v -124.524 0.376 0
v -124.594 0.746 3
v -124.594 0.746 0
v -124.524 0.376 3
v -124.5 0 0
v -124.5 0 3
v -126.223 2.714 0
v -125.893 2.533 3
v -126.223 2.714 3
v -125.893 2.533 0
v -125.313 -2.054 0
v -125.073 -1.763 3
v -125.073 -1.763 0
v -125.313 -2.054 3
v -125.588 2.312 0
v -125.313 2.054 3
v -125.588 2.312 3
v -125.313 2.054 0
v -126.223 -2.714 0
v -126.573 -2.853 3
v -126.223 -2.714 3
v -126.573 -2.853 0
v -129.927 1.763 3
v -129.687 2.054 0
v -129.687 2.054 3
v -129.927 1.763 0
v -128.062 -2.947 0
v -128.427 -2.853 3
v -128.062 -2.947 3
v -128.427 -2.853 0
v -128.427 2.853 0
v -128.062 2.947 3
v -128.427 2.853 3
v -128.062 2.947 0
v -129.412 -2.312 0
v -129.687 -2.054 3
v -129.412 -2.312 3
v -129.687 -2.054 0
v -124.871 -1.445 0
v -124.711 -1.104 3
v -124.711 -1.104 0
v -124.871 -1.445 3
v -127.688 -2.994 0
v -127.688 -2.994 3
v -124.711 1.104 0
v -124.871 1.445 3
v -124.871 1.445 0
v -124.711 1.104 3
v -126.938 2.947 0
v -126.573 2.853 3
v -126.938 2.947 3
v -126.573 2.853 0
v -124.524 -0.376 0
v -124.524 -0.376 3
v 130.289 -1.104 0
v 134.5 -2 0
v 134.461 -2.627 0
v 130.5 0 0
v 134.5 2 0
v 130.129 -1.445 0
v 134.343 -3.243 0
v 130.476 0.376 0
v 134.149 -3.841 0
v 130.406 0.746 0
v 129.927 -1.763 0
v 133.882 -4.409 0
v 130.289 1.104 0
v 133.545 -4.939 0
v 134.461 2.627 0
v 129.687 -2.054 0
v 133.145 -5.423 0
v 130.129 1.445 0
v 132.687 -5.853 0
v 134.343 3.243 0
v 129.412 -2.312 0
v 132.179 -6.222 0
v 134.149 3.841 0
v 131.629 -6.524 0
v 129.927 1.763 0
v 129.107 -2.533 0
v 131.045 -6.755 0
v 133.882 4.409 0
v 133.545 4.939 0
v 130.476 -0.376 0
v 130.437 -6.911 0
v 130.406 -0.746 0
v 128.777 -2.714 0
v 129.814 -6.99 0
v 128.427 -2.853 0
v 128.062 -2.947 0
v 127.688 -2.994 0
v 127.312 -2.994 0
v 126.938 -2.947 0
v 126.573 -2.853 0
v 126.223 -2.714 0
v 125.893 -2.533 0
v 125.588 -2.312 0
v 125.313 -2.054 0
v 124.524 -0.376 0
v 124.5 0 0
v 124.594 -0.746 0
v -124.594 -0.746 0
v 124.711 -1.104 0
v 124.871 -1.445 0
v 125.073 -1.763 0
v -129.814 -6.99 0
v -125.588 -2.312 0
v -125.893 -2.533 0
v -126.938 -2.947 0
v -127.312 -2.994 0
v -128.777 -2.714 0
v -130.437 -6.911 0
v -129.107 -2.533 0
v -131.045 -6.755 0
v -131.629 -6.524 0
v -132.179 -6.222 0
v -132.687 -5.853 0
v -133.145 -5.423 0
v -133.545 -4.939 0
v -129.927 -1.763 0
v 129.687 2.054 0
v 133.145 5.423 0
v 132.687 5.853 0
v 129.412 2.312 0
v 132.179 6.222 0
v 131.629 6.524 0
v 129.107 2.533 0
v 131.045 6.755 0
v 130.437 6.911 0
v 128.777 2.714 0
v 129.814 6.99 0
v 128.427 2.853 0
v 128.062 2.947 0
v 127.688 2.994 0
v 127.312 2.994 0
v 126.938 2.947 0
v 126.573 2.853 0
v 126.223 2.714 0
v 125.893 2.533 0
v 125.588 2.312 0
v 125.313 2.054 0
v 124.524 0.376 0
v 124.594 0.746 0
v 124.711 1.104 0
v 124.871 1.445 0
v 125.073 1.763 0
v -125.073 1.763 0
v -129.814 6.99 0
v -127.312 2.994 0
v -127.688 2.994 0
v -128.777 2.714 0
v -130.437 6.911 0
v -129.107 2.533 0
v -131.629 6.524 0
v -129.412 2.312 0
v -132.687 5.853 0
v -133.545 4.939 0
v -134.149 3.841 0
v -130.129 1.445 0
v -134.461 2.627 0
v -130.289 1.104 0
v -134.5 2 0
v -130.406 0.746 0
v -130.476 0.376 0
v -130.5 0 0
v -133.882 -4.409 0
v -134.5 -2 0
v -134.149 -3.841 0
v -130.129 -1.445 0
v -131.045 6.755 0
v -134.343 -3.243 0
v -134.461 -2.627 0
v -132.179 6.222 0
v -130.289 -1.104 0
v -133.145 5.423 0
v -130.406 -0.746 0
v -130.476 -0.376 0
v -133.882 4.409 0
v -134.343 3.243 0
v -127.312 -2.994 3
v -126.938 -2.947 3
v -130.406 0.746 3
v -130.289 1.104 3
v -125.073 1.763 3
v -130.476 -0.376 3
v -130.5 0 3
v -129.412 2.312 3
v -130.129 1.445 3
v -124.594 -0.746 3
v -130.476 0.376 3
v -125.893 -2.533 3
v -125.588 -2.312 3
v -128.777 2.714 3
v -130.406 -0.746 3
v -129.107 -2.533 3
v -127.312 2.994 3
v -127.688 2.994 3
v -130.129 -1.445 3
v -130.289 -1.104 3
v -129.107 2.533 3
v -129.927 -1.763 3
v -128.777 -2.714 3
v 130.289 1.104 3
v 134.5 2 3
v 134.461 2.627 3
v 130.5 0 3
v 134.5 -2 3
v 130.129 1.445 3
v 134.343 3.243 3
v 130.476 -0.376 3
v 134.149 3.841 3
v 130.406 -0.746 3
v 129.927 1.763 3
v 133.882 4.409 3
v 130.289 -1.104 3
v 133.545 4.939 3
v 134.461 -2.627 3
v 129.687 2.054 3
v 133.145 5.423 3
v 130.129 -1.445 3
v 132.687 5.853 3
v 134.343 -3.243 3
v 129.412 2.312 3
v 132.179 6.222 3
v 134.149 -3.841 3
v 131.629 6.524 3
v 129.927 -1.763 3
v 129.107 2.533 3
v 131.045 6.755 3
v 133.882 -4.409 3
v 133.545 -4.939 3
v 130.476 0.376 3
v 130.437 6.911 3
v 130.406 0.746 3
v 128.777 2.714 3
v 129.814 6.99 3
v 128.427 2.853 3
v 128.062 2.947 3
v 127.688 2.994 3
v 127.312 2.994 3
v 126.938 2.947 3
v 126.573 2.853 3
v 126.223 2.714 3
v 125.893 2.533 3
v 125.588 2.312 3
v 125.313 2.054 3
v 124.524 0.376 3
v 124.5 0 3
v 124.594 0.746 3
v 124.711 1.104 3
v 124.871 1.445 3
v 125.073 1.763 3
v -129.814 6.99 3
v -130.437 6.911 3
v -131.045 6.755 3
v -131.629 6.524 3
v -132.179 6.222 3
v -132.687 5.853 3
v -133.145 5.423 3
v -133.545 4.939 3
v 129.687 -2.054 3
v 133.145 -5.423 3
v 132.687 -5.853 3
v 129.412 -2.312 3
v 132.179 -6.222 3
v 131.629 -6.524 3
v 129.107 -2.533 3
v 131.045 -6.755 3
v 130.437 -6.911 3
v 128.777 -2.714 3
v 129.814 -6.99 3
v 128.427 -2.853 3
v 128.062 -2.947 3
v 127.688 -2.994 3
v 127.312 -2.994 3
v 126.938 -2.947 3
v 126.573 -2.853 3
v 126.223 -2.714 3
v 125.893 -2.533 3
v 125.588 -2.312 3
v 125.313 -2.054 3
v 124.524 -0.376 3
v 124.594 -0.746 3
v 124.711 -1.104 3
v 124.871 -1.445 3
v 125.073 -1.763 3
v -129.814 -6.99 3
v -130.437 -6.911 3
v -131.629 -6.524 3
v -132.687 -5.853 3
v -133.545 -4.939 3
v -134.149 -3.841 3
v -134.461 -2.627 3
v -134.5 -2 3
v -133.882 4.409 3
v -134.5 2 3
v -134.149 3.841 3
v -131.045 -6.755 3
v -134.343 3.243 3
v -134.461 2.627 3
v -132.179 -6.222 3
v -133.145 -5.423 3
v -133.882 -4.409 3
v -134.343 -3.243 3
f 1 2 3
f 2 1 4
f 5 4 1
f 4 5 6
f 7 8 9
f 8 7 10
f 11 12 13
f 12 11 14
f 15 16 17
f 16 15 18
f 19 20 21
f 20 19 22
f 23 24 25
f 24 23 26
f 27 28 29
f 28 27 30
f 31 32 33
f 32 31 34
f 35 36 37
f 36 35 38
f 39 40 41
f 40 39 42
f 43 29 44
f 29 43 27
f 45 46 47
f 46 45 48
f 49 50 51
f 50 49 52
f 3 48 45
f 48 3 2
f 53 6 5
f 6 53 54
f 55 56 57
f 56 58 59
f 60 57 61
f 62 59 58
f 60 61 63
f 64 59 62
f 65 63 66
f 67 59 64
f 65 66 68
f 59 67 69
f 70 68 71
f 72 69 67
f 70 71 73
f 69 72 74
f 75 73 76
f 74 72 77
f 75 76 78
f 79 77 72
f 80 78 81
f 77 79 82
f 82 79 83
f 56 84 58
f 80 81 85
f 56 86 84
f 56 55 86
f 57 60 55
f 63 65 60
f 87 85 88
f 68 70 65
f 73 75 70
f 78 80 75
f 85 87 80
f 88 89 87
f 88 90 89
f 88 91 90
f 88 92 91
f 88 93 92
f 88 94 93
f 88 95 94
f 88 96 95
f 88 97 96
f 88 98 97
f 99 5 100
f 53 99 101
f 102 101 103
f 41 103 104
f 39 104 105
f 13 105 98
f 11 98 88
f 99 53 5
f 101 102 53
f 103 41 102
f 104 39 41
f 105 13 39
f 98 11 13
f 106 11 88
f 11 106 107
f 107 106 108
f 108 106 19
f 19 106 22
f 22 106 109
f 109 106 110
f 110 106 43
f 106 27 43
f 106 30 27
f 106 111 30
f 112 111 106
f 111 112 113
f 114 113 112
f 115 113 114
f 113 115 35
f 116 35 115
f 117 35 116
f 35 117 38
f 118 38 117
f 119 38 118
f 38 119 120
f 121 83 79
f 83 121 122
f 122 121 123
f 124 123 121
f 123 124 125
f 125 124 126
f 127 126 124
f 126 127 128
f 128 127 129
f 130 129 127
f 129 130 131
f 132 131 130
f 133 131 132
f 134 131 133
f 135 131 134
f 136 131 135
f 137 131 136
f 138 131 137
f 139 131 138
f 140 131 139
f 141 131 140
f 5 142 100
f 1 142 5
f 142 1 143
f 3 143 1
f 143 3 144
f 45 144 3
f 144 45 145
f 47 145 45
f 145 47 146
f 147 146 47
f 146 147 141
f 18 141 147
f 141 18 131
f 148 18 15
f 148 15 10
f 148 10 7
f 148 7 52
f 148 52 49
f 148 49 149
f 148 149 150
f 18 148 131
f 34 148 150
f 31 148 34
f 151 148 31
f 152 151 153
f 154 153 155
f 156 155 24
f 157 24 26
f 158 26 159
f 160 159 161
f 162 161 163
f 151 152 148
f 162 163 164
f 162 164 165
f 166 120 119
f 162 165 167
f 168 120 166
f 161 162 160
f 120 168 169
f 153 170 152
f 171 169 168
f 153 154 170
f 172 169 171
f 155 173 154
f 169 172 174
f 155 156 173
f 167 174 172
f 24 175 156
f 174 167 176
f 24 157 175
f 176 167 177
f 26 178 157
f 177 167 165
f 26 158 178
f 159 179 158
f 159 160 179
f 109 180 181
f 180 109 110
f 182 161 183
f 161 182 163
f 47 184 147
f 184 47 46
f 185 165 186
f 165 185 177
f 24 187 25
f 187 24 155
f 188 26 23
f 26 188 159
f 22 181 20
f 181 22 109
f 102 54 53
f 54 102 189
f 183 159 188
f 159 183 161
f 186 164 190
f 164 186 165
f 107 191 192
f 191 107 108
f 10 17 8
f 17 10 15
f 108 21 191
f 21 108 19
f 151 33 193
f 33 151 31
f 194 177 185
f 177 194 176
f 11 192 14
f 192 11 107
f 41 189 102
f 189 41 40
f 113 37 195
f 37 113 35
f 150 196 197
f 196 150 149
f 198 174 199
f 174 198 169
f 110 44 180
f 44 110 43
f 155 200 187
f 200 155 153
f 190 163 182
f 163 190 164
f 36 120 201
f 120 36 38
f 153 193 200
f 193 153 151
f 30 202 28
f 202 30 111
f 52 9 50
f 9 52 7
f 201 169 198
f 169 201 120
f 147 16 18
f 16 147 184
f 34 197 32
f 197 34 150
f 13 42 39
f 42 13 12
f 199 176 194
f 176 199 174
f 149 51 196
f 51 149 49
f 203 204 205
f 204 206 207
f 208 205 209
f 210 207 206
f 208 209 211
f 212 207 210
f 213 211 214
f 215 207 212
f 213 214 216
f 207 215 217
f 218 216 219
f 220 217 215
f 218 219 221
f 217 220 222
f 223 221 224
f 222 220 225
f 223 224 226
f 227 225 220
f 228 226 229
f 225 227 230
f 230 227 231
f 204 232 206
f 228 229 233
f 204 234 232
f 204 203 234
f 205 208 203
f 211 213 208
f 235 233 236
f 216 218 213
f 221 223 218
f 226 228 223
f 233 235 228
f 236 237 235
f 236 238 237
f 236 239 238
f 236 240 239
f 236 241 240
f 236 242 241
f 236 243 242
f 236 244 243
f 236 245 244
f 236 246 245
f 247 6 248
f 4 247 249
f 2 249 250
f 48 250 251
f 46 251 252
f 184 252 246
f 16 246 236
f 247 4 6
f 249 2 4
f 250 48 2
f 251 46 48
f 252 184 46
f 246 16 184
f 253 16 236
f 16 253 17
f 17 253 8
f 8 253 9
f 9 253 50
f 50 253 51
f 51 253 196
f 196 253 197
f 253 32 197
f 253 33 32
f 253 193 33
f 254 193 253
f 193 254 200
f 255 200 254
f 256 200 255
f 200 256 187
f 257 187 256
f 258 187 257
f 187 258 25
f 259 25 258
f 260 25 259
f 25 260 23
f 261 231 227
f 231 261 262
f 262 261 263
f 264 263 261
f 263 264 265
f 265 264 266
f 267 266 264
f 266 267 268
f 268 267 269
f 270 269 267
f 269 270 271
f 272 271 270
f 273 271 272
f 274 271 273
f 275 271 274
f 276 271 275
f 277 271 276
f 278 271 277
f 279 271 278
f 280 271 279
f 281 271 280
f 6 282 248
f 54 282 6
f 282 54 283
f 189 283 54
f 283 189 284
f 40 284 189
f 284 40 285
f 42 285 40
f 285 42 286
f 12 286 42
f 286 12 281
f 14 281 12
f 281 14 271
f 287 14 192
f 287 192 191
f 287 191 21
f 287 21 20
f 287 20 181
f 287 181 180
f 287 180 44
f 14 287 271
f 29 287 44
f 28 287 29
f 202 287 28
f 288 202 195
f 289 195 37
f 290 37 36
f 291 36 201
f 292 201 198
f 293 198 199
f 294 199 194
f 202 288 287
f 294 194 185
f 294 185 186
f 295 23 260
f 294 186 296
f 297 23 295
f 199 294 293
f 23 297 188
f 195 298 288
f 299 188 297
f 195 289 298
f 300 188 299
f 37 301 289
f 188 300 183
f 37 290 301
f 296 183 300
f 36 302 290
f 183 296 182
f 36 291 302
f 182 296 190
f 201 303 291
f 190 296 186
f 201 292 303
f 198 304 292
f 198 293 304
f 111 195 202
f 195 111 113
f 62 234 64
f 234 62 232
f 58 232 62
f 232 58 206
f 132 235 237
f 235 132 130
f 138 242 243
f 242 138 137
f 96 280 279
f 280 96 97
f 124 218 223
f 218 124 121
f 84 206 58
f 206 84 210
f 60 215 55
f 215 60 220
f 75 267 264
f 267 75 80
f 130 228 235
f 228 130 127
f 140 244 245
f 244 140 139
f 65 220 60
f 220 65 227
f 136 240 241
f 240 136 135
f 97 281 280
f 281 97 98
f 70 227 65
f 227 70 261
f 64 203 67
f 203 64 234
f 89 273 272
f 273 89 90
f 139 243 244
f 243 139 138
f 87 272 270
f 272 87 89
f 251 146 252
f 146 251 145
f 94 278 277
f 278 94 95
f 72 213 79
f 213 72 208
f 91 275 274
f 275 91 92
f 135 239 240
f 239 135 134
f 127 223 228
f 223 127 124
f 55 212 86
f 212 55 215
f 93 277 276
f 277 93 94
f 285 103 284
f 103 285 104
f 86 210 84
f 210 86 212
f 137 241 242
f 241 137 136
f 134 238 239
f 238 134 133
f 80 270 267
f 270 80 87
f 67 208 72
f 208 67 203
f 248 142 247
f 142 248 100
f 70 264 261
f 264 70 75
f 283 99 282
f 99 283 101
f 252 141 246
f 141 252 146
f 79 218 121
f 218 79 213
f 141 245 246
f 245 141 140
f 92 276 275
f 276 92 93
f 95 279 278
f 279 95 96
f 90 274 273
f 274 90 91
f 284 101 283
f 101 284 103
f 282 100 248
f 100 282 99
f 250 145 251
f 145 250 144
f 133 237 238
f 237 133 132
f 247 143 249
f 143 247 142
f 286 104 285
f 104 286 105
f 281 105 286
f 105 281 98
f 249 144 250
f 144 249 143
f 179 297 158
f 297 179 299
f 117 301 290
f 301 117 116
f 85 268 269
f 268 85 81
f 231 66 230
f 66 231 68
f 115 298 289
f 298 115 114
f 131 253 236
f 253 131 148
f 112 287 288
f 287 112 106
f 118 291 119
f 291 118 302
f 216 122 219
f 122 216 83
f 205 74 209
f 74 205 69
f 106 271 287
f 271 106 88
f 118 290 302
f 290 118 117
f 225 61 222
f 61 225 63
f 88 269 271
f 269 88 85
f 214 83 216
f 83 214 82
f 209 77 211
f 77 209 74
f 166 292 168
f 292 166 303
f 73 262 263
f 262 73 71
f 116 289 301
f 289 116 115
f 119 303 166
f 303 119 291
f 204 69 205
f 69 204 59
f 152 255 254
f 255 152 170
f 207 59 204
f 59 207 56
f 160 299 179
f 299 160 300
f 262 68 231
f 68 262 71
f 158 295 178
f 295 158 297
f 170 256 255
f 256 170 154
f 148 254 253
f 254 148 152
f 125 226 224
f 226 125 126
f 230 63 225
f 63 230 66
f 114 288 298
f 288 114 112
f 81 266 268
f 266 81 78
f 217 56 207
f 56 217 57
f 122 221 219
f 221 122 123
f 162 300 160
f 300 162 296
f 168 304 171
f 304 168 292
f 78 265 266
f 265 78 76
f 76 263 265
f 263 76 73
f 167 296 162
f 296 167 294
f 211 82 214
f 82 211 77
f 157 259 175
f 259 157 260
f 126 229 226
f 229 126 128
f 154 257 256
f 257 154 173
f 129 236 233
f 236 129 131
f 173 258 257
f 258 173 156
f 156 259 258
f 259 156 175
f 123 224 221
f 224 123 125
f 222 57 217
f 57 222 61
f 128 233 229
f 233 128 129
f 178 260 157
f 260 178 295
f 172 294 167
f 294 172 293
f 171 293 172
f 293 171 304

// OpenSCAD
$fn = 50;


difference() {
	union() {
		hull() {
			translate(v = [-129.5000000000, 2.0000000000, 0]) {
				cylinder(h = 3, r = 5);
			}
			translate(v = [129.5000000000, 2.0000000000, 0]) {
				cylinder(h = 3, r = 5);
			}
			translate(v = [-129.5000000000, -2.0000000000, 0]) {
				cylinder(h = 3, r = 5);
			}
			translate(v = [129.5000000000, -2.0000000000, 0]) {
				cylinder(h = 3, r = 5);
			}
		}
	}
	union() {
		translate(v = [-127.5000000000, 0.0000000000, 0]) {
			cylinder(h = 3, r = 3.0000000000);
		}
		translate(v = [127.5000000000, 0.0000000000, 0]) {
			cylinder(h = 3, r = 3.0000000000);
		}
		translate(v = [-127.5000000000, 0.0000000000, 0]) {
			cylinder(h = 3, r = 1.5000000000);
		}
		translate(v = [127.5000000000, 0.0000000000, 0]) {
			cylinder(h = 3, r = 1.5000000000);
		}
		translate(v = [-127.5000000000, 0.0000000000, 0]) {
			cylinder(h = 3, r = 1.5000000000);
		}
		translate(v = [127.5000000000, 0.0000000000, 0]) {
			cylinder(h = 3, r = 1.5000000000);
		}
		translate(v = [-127.5000000000, 0.0000000000, 0]) {
			cylinder(h = 3, r = 1.5000000000);
		}
		translate(v = [127.5000000000, 0.0000000000, 0]) {
			cylinder(h = 3, r = 1.5000000000);
		}
	}
}
